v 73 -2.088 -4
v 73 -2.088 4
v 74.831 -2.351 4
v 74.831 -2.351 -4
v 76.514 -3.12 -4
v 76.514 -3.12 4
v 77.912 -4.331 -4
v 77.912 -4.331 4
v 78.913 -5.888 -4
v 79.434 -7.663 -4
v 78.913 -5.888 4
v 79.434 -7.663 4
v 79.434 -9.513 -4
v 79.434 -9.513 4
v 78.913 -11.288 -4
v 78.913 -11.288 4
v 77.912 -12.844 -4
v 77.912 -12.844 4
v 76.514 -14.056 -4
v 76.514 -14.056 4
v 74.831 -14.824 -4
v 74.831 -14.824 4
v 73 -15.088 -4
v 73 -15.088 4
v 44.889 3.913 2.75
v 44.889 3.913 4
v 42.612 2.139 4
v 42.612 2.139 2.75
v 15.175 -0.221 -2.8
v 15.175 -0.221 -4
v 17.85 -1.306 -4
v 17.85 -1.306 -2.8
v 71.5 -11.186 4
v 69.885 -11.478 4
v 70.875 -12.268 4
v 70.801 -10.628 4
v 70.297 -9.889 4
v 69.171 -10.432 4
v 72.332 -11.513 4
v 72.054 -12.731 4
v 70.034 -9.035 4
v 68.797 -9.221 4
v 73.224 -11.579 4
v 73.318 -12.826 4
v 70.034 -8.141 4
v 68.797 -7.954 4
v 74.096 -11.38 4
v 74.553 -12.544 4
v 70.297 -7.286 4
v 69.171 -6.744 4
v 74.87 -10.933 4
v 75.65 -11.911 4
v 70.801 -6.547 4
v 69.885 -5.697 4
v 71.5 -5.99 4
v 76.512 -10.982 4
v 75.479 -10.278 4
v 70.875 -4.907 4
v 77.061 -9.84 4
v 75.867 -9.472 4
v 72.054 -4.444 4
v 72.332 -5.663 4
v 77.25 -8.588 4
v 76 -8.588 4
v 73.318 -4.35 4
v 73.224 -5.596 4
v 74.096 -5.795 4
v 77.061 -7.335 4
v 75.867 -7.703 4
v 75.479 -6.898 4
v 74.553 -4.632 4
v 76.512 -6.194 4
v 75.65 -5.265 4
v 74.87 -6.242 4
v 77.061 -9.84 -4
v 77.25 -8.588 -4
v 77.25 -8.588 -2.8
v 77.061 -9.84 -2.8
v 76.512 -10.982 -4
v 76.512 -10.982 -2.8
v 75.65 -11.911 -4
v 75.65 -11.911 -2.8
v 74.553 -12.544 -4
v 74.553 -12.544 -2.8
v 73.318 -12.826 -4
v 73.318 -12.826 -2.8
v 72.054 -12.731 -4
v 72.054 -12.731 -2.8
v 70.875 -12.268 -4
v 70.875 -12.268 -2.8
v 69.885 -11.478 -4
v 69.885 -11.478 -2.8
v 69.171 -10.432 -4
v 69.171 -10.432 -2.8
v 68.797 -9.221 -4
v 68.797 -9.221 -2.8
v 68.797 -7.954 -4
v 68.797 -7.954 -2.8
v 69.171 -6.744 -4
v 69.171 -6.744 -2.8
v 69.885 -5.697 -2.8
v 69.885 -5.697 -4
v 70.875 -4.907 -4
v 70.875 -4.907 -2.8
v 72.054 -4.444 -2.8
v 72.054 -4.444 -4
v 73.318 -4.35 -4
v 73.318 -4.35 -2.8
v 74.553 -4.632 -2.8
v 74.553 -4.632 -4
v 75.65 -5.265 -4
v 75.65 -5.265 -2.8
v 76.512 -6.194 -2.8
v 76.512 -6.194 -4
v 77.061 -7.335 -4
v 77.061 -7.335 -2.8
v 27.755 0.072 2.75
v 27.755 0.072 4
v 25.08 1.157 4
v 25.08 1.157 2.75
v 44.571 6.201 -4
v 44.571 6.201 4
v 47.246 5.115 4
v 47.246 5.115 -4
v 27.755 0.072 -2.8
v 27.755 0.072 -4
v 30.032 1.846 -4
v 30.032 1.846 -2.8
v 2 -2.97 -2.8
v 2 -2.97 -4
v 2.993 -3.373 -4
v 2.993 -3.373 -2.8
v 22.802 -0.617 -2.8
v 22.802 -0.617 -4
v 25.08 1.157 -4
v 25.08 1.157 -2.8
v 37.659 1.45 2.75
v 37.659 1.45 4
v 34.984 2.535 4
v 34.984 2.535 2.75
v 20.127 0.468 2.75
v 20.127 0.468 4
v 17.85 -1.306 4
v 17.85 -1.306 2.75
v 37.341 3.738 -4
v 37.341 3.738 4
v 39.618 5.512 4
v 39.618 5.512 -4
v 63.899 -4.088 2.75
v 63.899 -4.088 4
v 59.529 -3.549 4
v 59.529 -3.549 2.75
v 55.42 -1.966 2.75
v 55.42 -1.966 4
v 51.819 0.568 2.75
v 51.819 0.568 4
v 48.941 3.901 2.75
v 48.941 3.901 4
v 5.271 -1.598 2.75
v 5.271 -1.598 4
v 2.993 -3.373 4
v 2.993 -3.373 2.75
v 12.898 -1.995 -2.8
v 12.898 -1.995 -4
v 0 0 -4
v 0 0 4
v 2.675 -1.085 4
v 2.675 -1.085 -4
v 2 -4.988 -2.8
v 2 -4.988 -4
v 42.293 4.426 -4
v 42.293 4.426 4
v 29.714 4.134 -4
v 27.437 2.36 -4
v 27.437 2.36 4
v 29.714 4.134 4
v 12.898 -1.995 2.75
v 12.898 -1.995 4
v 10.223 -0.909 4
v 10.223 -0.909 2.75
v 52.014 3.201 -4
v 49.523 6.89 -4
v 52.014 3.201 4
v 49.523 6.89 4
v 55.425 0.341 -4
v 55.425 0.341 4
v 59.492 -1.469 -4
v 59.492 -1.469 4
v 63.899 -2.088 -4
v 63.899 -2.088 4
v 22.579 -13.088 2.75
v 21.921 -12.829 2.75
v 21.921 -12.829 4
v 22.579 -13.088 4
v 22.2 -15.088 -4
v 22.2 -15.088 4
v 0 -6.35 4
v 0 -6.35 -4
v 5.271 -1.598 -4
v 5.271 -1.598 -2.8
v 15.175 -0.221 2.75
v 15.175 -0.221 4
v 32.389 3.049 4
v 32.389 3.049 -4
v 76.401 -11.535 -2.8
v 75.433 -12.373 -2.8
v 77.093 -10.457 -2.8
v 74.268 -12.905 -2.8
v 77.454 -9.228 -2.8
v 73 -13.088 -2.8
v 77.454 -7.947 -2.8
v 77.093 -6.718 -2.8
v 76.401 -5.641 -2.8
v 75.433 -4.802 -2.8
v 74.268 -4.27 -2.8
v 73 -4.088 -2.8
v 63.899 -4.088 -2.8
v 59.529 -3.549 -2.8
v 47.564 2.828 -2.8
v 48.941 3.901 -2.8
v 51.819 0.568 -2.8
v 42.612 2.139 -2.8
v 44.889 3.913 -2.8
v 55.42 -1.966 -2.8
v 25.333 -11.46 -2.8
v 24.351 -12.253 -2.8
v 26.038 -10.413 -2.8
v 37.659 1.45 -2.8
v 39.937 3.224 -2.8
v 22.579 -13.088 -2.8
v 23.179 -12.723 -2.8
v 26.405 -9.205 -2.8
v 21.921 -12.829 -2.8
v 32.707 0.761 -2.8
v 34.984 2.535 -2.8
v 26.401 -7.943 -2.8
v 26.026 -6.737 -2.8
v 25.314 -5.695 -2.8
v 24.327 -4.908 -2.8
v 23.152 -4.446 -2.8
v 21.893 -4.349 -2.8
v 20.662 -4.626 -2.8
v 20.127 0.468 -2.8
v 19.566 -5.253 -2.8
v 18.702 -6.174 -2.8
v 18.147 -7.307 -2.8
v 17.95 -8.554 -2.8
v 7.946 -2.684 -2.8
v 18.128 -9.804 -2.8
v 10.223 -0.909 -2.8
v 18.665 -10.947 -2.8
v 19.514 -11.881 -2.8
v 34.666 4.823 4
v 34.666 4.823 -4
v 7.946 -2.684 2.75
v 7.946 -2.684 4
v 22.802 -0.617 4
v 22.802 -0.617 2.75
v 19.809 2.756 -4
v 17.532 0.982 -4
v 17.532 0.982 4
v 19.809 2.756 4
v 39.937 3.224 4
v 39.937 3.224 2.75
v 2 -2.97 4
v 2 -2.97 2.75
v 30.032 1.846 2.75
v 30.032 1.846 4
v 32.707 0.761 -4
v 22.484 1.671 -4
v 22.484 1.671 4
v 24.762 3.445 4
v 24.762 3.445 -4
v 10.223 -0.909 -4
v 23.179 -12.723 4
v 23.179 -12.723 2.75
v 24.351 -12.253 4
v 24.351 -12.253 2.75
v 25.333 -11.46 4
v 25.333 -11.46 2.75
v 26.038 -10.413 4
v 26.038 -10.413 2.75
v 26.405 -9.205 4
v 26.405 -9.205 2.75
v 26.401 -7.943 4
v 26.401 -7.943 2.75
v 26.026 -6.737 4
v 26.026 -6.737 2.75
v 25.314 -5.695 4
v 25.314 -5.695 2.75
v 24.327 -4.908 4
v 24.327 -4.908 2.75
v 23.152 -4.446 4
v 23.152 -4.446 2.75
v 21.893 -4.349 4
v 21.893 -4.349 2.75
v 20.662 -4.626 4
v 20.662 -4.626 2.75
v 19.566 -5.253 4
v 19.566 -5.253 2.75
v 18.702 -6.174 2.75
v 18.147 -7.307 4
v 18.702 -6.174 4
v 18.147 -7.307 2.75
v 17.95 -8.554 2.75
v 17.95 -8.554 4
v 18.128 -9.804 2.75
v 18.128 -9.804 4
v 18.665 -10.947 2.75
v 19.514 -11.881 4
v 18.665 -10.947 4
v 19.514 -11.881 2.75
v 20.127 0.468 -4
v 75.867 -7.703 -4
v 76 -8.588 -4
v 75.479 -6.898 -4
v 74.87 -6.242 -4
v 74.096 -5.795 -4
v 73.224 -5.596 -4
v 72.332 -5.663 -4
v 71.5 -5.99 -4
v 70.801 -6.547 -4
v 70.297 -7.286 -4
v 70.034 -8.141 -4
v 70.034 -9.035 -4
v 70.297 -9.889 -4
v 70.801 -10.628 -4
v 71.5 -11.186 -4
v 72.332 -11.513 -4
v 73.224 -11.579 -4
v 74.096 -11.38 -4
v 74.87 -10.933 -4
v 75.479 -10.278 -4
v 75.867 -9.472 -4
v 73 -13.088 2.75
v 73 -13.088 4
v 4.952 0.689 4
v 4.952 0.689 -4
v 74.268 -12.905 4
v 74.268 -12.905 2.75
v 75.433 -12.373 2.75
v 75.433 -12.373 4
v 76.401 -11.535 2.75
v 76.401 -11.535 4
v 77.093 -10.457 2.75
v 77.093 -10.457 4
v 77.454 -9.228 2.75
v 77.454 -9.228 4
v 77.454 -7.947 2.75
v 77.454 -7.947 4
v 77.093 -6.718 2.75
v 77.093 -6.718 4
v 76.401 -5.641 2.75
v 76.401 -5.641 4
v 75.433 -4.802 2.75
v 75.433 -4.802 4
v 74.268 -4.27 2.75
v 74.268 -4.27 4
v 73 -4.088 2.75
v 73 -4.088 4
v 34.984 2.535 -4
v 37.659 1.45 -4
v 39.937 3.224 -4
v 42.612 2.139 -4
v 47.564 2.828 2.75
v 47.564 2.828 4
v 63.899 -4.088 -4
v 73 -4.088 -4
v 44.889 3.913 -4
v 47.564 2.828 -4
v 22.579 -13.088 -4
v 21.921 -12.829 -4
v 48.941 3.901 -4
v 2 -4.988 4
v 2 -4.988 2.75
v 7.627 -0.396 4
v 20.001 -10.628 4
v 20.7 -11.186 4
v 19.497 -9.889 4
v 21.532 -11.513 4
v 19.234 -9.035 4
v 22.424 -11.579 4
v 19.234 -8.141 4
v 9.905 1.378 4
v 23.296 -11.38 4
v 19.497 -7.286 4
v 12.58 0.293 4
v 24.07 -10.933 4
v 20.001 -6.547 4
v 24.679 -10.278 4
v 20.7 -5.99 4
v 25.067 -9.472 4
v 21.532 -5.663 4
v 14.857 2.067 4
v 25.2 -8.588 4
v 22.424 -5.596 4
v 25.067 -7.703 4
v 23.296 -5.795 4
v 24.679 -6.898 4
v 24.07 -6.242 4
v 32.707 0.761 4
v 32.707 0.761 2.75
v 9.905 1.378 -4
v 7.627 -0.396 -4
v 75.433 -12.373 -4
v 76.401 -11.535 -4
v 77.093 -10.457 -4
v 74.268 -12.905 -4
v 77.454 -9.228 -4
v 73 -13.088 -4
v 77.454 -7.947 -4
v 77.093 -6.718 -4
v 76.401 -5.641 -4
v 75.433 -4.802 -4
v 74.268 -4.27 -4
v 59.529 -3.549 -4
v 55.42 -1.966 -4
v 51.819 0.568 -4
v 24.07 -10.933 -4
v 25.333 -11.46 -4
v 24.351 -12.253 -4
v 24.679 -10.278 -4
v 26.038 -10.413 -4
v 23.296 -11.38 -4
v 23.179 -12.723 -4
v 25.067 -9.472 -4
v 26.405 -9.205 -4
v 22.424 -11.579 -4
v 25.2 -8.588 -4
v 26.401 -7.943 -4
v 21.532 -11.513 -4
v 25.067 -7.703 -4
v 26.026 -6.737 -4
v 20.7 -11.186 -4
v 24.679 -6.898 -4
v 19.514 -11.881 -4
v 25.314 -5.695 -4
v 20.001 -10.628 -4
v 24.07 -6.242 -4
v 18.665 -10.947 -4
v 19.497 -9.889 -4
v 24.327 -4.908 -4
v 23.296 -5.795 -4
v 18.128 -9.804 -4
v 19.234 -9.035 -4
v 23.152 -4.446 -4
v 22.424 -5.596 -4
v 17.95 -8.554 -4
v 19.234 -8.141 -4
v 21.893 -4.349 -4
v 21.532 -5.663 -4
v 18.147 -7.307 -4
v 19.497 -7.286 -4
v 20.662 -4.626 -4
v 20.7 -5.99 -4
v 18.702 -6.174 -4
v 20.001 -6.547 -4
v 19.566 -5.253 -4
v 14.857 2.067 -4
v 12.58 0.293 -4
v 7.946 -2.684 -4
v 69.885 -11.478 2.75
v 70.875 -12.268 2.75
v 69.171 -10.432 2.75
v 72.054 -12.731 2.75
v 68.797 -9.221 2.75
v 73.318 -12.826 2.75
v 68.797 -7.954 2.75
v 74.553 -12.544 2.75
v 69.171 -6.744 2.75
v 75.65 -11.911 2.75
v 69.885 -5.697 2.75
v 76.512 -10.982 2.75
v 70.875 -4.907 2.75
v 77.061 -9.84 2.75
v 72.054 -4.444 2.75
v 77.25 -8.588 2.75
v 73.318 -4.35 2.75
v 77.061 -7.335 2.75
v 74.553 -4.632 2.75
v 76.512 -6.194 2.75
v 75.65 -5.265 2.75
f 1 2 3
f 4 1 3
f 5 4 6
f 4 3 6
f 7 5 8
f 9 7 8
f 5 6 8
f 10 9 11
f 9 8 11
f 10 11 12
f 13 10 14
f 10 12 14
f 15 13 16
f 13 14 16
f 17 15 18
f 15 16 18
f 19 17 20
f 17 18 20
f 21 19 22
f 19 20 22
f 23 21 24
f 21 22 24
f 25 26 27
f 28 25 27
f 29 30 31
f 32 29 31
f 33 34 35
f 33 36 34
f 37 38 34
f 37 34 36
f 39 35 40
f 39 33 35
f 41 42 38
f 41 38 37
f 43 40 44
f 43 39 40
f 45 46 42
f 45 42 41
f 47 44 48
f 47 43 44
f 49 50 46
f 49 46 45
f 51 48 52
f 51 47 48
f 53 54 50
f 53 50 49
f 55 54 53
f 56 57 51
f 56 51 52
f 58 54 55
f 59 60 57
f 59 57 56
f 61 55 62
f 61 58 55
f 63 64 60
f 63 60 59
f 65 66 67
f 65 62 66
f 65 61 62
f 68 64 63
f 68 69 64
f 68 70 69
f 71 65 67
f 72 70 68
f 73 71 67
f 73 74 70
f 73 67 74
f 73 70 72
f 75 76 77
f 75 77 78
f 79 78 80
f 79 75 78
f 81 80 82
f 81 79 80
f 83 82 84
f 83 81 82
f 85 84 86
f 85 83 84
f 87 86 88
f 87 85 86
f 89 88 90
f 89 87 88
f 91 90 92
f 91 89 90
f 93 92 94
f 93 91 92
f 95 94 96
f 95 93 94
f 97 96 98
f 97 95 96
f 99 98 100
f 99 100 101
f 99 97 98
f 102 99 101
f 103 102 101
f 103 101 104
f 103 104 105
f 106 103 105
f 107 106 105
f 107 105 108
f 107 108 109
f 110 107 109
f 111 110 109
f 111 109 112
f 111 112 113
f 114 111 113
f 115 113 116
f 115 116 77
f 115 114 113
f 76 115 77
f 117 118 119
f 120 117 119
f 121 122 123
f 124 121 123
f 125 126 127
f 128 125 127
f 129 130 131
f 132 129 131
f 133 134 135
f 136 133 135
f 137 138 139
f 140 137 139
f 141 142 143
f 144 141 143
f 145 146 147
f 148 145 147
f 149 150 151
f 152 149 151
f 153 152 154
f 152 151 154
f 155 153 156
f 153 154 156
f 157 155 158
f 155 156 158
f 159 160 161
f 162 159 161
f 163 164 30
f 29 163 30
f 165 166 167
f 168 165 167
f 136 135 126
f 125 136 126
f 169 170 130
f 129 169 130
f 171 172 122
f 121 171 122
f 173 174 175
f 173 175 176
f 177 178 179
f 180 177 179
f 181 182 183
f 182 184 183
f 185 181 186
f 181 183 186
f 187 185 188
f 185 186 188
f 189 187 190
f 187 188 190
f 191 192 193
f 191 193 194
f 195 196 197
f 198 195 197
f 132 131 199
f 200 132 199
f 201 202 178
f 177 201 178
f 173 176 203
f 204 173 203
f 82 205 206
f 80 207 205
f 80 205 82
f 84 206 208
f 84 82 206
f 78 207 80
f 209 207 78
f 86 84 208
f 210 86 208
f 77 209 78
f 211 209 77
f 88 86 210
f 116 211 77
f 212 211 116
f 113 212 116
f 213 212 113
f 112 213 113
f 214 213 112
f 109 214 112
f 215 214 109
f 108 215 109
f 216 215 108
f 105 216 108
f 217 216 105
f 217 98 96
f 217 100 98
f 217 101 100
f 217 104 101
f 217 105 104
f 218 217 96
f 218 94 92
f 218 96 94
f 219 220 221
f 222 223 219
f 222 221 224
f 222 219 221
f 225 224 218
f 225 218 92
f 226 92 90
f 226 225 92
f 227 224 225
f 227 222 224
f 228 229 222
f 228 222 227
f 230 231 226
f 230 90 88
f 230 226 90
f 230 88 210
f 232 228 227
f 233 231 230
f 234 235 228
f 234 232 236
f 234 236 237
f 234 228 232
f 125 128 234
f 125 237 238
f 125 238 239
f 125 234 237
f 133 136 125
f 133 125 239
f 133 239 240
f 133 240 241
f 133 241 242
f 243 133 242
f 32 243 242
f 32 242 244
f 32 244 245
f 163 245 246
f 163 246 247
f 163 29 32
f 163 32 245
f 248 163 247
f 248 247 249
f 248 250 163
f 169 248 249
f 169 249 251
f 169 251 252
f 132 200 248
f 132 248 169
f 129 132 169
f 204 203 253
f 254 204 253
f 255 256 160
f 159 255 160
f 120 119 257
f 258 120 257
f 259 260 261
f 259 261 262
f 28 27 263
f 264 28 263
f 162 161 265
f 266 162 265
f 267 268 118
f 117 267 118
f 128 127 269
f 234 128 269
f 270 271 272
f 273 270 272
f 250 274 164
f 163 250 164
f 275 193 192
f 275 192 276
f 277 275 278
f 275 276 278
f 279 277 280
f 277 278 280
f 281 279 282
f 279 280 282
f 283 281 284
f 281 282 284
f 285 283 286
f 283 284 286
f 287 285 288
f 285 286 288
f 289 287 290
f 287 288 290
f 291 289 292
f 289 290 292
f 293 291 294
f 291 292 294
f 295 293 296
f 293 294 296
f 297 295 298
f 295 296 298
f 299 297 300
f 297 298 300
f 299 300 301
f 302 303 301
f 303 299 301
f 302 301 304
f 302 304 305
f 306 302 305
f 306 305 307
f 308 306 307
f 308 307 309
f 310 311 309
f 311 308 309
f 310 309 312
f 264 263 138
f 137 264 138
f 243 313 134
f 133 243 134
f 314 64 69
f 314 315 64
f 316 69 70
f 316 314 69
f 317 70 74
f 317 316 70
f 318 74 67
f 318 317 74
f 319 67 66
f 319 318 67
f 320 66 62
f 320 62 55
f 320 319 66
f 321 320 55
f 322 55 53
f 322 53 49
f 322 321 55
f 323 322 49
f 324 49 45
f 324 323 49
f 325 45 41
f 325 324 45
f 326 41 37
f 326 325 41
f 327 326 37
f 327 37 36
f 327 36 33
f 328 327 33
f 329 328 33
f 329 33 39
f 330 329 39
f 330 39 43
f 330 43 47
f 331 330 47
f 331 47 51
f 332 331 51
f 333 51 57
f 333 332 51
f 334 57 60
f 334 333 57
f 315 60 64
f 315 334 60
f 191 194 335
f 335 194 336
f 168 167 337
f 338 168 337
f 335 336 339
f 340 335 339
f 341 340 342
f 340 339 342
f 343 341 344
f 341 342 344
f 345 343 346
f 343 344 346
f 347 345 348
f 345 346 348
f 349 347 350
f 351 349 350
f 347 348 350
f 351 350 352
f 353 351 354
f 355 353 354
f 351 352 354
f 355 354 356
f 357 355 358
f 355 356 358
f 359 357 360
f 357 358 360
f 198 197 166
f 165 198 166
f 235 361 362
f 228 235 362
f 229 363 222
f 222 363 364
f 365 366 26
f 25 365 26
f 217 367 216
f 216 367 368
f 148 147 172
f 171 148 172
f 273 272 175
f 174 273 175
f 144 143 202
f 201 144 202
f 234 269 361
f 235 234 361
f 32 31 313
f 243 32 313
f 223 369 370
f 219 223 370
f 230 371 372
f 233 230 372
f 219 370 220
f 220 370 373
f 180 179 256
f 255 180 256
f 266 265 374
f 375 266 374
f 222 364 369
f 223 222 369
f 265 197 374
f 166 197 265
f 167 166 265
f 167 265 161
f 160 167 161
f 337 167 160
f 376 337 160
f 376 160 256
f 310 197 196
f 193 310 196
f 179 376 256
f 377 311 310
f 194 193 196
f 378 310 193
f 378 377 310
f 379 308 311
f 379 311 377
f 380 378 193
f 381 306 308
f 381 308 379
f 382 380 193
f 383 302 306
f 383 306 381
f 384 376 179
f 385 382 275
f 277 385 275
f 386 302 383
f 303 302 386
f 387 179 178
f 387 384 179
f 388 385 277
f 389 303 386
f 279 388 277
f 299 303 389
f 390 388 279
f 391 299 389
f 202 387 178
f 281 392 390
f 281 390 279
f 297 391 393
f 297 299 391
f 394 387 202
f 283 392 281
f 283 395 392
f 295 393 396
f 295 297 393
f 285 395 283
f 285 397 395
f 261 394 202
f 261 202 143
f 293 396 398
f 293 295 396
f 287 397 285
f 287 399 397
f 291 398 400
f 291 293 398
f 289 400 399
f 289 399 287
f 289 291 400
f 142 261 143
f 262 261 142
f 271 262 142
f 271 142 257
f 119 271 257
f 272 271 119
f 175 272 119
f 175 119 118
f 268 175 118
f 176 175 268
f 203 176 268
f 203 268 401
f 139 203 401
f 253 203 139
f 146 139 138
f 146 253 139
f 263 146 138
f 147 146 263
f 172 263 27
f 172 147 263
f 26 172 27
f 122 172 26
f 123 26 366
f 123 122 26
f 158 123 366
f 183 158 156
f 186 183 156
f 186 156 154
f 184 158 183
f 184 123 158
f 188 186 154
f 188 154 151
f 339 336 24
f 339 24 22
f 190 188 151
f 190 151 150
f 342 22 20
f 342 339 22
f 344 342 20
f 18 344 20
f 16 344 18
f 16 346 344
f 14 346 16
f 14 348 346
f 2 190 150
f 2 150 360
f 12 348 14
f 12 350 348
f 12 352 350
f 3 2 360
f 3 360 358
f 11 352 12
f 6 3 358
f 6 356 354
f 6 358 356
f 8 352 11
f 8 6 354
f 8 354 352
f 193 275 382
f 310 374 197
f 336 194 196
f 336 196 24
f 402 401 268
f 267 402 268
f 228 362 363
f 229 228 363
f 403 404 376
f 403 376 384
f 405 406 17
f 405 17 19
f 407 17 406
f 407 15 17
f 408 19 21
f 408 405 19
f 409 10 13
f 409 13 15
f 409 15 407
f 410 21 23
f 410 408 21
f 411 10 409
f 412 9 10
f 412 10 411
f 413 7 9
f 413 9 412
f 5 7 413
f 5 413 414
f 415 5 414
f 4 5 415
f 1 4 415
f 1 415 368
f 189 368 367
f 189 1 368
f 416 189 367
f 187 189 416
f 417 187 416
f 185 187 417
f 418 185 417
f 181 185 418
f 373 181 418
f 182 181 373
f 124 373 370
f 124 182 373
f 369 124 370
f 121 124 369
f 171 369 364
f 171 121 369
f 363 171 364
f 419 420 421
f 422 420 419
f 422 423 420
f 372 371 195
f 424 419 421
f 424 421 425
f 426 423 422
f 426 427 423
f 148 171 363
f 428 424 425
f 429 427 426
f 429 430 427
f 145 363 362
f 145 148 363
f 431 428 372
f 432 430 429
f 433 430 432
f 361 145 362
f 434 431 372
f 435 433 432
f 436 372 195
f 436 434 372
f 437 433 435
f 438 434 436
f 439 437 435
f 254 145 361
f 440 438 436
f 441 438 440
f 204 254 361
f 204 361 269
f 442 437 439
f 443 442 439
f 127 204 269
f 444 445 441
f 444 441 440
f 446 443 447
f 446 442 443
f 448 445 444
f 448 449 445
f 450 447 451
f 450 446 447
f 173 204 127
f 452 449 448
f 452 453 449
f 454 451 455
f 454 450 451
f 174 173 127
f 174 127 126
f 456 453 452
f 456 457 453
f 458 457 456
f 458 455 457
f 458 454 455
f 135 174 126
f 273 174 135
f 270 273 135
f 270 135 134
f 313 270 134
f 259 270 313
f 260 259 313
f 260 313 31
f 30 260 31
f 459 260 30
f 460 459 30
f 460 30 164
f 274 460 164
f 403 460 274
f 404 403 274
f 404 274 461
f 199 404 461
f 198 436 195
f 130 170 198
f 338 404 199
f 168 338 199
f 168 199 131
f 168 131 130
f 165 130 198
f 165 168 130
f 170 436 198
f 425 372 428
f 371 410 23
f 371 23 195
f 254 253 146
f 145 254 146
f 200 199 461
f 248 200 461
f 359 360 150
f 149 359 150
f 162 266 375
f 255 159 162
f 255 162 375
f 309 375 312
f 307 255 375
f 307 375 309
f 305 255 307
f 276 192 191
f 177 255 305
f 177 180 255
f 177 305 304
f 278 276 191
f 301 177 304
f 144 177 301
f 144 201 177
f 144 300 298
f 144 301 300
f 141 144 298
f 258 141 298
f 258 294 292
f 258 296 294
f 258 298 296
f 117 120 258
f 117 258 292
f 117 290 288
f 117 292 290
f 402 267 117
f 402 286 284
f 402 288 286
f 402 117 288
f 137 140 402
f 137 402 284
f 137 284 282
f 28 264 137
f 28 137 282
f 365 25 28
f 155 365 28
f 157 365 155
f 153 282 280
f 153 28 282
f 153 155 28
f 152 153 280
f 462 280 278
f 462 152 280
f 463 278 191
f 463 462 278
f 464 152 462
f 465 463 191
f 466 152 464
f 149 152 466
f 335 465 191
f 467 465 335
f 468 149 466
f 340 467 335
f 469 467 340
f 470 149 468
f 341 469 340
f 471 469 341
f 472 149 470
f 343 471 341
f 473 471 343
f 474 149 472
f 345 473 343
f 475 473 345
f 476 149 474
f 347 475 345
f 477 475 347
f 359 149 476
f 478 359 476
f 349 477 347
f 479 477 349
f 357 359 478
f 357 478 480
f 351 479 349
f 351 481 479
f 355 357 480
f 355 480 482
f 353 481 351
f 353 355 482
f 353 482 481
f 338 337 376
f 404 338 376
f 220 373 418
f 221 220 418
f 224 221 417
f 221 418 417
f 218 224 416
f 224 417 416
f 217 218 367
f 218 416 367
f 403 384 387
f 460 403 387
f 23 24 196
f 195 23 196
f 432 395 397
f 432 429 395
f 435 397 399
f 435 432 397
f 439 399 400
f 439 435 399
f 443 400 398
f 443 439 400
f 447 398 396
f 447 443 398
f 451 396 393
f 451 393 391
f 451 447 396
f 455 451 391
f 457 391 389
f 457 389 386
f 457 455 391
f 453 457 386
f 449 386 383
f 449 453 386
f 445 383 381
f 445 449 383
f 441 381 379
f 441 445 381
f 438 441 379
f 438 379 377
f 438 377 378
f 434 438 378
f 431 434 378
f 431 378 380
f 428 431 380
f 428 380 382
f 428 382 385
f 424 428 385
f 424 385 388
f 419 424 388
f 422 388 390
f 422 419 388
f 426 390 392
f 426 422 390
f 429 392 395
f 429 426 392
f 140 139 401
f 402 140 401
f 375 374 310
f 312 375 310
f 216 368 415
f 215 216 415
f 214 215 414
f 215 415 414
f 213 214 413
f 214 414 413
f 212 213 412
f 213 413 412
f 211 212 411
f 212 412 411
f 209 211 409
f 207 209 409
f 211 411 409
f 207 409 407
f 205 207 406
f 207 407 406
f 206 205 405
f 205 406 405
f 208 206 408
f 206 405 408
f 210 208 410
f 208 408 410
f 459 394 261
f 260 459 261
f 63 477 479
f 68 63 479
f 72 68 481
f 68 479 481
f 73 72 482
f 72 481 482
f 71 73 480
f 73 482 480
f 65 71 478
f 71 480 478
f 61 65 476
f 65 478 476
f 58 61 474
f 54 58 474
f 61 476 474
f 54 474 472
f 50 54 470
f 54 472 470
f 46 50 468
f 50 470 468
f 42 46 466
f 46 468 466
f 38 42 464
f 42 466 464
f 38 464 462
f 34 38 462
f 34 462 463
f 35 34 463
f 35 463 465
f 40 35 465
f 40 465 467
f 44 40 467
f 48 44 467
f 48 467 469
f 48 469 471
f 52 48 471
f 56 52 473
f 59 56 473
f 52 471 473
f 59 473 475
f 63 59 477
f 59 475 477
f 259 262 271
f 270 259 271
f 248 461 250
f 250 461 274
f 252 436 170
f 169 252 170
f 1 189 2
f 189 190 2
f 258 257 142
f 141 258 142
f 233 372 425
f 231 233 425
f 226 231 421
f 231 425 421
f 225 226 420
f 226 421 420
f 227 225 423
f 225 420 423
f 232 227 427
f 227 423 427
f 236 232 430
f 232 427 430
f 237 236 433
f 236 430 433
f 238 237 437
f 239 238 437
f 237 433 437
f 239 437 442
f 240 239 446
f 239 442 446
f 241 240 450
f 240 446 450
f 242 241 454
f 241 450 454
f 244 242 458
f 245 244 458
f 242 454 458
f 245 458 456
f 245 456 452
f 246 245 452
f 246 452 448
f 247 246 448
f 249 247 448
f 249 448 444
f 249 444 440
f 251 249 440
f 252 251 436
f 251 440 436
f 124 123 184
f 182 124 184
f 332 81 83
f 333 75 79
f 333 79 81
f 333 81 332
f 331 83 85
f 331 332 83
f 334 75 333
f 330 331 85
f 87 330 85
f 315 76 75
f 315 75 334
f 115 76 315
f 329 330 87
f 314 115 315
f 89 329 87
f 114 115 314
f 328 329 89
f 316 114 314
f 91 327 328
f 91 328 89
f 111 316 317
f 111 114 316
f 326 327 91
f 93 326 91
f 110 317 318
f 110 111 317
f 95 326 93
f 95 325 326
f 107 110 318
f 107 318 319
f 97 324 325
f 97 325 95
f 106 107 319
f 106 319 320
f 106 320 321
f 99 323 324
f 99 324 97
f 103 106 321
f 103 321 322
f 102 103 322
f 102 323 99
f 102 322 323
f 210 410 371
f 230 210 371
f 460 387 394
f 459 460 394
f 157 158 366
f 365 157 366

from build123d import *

# Parameters (mm, degrees)
SKETCH1_R           = 3
BOSS_EXTRUDE1_DEPTH = 4
CUT_EXTRUDE3_DEPTH  = 82.313525364
CUT_EXTRUDE2_DEPTH  = 1.25
SKETCH6_R           = 4.25
SKETCH6_R_2         = 3
BOSS_EXTRUDE2_DEPTH = 1.25
SKETCH7_R           = 4.25
CUT_EXTRUDE4_DEPTH  = 1.2


with BuildPart() as part:
    # Sketch1 → Boss-Extrude1 (new, symmetric)
    with BuildSketch(Plane.XY):
        with BuildLine():
            Line((0, -6.35), (0, 0))
            Line((0, 0), (49.523071285, 6.889514534))
            ThreePointArc((49.523071285, 6.889514534), (55.424924624, 0.340905899), (63.899469217, -2.087723723))
            Line((63.899469217, -2.087723723), (73, -2.087723723))
            ThreePointArc((73, -2.087723723), (79.5, -8.587723723), (73, -15.087723723))
            Line((73, -15.087723723), (22.2, -15.087723723))
            Line((22.2, -15.087723723), (0, -6.35))
        make_face()
        with Locations((73, -8.587723723)):
            Circle(SKETCH1_R, mode=Mode.SUBTRACT)
        with Locations((22.2, -8.587723723)):
            Circle(SKETCH1_R, mode=Mode.SUBTRACT)
    extrude(amount=BOSS_EXTRUDE1_DEPTH, both=True)

    # Sketch5 → Cut-Extrude3 (cut, through all)
    with BuildSketch(Plane.XY.offset(4)):
        Polygon((4.952307128, 0.688951453), (0, 0), (2.675036718, -1.0851322), align=None)
        Polygon((49.523071285, 6.889514534), (44.570764156, 6.200563081), (47.245800874, 5.115430881), align=None)
        Polygon((44.570764156, 6.200563081), (39.618457028, 5.511611627), (42.293493746, 4.426479427), align=None)
        Polygon((39.618457028, 5.511611627), (34.666149899, 4.822660174), (37.341186617, 3.737527974), align=None)
        Polygon((34.666149899, 4.822660174), (29.713842771, 4.133708721), (32.388879489, 3.04857652), align=None)
        Polygon((29.713842771, 4.133708721), (24.761535642, 3.444757267), (27.43657236, 2.359625067), align=None)
        Polygon((24.761535642, 3.444757267), (19.809228514, 2.755805814), (22.484265232, 1.670673614), align=None)
        Polygon((19.809228514, 2.755805814), (14.856921385, 2.06685436), (17.531958103, 0.98172216), align=None)
        Polygon((14.856921385, 2.06685436), (9.904614257, 1.377902907), (12.579650975, 0.292770707), align=None)
        Polygon((9.904614257, 1.377902907), (4.952307128, 0.688951453), (7.627343846, -0.396180747), align=None)
    extrude(amount=-CUT_EXTRUDE3_DEPTH, mode=Mode.SUBTRACT)

    # Sketch4 → Cut-Extrude2 (cut)
    with BuildSketch(Plane.XY.offset(4)):
        with BuildLine():
            Line((22.579425451, -13.087723723), (73, -13.087723723))
            ThreePointArc((73, -13.087723723), (77.5, -8.587723723), (73, -4.087723723))
            Line((73, -4.087723723), (63.899469217, -4.087723723))
            ThreePointArc((63.899469217, -4.087723723), (55.420413641, -1.965557849), (48.940687218, 3.900541107))
            Line((48.940687218, 3.900541107), (47.56401392, 2.828058198))
            Line((47.56401392, 2.828058198), (44.888977202, 3.913190398))
            Line((44.888977202, 3.913190398), (42.611706791, 2.139106744))
            Line((42.611706791, 2.139106744), (39.936670074, 3.224238944))
            Line((39.936670074, 3.224238944), (37.659399663, 1.450155291))
            Line((37.659399663, 1.450155291), (34.984362945, 2.535287491))
            Line((34.984362945, 2.535287491), (32.707092534, 0.761203837))
            Line((32.707092534, 0.761203837), (30.032055817, 1.846336038))
            Line((30.032055817, 1.846336038), (27.754785406, 0.072252384))
            Line((27.754785406, 0.072252384), (25.079748688, 1.157384584))
            Line((25.079748688, 1.157384584), (22.802478277, -0.616699069))
            Line((22.802478277, -0.616699069), (20.12744156, 0.468433131))
            Line((20.12744156, 0.468433131), (17.850171149, -1.305650523))
            Line((17.850171149, -1.305650523), (15.175134431, -0.220518323))
            Line((15.175134431, -0.220518323), (12.89786402, -1.994601976))
            Line((12.89786402, -1.994601976), (10.222827303, -0.909469776))
            Line((10.222827303, -0.909469776), (7.945556892, -2.68355343))
            Line((7.945556892, -2.68355343), (5.270520174, -1.59842123))
            Line((5.270520174, -1.59842123), (2.993249763, -3.372504883))
            Line((2.993249763, -3.372504883), (2, -2.969591796))
            Line((2, -2.969591796), (2, -4.987843814))
            Line((2, -4.987843814), (22.579425451, -13.087723723))
        make_face()
    extrude(amount=-CUT_EXTRUDE2_DEPTH, mode=Mode.SUBTRACT)

    # Sketch6 → Boss-Extrude2 (add)
    # profile 1 of 2: a face of its own
    with BuildSketch(Plane.XY.offset(2.75)):
        with Locations((22.2, -8.587723723)):
            Circle(SKETCH6_R)
        with Locations((22.2, -8.587723723)):
            Circle(SKETCH6_R_2, mode=Mode.SUBTRACT)
    # profile 2 of 2: a face of its own
    with BuildSketch(Plane.XY.offset(2.75)):
        with Locations((73, -8.587723723)):
            Circle(SKETCH6_R)
        with Locations((73, -8.587723723)):
            Circle(SKETCH6_R_2, mode=Mode.SUBTRACT)
    extrude(amount=BOSS_EXTRUDE2_DEPTH)

    # Sketch7 → Cut-Extrude4 (cut)
    with BuildSketch(Plane(origin=(0, 0, -4), x_dir=(-1, 0, 0), z_dir=(0, 0, -1))):
        with BuildLine():
            Line((-20.12744156, 0.468433131), (-22.802478277, -0.616699069))
            Line((-22.802478277, -0.616699069), (-25.079748688, 1.157384584))
            Line((-25.079748688, 1.157384584), (-27.754785406, 0.072252384))
            Line((-27.754785406, 0.072252384), (-30.032055817, 1.846336038))
            Line((-30.032055817, 1.846336038), (-32.707092534, 0.761203837))
            Line((-32.707092534, 0.761203837), (-34.984362945, 2.535287491))
            Line((-34.984362945, 2.535287491), (-37.659399663, 1.450155291))
            Line((-37.659399663, 1.450155291), (-39.936670074, 3.224238944))
            Line((-39.936670074, 3.224238944), (-42.611706791, 2.139106744))
            Line((-42.611706791, 2.139106744), (-44.888977202, 3.913190398))
            Line((-44.888977202, 3.913190398), (-47.56401392, 2.828058198))
            Line((-47.56401392, 2.828058198), (-48.940687218, 3.900541107))
            ThreePointArc((-48.940687218, 3.900541107), (-55.420413641, -1.965557849), (-63.899469217, -4.087723723))
            Line((-63.899469217, -4.087723723), (-73, -4.087723723))
            ThreePointArc((-73, -4.087723723), (-77.5, -8.587723723), (-73, -13.087723723))
            Line((-73, -13.087723723), (-22.579425451, -13.087723723))
            Line((-22.579425451, -13.087723723), (-21.920947479, -12.828552615))
            ThreePointArc((-21.920947479, -12.828552615), (-23.756536974, -4.633018595), (-19.513668259, -11.881068798))
            Line((-19.513668259, -11.881068798), (-2, -4.987843814))
            Line((-2, -4.987843814), (-2, -2.969591796))
            Line((-2, -2.969591796), (-2.993249763, -3.372504883))
            Line((-2.993249763, -3.372504883), (-5.270520174, -1.59842123))
            Line((-5.270520174, -1.59842123), (-7.945556892, -2.68355343))
            Line((-7.945556892, -2.68355343), (-10.222827303, -0.909469776))
            Line((-10.222827303, -0.909469776), (-12.89786402, -1.994601976))
            Line((-12.89786402, -1.994601976), (-15.175134431, -0.220518323))
            Line((-15.175134431, -0.220518323), (-17.850171149, -1.305650523))
            Line((-17.850171149, -1.305650523), (-20.12744156, 0.468433131))
        make_face()
        with Locations(Location((-73, -8.587723723, 0), (0, 0, 180))):
            Circle(SKETCH7_R, mode=Mode.SUBTRACT)
    extrude(amount=-CUT_EXTRUDE4_DEPTH, mode=Mode.SUBTRACT)


solid = part.part
